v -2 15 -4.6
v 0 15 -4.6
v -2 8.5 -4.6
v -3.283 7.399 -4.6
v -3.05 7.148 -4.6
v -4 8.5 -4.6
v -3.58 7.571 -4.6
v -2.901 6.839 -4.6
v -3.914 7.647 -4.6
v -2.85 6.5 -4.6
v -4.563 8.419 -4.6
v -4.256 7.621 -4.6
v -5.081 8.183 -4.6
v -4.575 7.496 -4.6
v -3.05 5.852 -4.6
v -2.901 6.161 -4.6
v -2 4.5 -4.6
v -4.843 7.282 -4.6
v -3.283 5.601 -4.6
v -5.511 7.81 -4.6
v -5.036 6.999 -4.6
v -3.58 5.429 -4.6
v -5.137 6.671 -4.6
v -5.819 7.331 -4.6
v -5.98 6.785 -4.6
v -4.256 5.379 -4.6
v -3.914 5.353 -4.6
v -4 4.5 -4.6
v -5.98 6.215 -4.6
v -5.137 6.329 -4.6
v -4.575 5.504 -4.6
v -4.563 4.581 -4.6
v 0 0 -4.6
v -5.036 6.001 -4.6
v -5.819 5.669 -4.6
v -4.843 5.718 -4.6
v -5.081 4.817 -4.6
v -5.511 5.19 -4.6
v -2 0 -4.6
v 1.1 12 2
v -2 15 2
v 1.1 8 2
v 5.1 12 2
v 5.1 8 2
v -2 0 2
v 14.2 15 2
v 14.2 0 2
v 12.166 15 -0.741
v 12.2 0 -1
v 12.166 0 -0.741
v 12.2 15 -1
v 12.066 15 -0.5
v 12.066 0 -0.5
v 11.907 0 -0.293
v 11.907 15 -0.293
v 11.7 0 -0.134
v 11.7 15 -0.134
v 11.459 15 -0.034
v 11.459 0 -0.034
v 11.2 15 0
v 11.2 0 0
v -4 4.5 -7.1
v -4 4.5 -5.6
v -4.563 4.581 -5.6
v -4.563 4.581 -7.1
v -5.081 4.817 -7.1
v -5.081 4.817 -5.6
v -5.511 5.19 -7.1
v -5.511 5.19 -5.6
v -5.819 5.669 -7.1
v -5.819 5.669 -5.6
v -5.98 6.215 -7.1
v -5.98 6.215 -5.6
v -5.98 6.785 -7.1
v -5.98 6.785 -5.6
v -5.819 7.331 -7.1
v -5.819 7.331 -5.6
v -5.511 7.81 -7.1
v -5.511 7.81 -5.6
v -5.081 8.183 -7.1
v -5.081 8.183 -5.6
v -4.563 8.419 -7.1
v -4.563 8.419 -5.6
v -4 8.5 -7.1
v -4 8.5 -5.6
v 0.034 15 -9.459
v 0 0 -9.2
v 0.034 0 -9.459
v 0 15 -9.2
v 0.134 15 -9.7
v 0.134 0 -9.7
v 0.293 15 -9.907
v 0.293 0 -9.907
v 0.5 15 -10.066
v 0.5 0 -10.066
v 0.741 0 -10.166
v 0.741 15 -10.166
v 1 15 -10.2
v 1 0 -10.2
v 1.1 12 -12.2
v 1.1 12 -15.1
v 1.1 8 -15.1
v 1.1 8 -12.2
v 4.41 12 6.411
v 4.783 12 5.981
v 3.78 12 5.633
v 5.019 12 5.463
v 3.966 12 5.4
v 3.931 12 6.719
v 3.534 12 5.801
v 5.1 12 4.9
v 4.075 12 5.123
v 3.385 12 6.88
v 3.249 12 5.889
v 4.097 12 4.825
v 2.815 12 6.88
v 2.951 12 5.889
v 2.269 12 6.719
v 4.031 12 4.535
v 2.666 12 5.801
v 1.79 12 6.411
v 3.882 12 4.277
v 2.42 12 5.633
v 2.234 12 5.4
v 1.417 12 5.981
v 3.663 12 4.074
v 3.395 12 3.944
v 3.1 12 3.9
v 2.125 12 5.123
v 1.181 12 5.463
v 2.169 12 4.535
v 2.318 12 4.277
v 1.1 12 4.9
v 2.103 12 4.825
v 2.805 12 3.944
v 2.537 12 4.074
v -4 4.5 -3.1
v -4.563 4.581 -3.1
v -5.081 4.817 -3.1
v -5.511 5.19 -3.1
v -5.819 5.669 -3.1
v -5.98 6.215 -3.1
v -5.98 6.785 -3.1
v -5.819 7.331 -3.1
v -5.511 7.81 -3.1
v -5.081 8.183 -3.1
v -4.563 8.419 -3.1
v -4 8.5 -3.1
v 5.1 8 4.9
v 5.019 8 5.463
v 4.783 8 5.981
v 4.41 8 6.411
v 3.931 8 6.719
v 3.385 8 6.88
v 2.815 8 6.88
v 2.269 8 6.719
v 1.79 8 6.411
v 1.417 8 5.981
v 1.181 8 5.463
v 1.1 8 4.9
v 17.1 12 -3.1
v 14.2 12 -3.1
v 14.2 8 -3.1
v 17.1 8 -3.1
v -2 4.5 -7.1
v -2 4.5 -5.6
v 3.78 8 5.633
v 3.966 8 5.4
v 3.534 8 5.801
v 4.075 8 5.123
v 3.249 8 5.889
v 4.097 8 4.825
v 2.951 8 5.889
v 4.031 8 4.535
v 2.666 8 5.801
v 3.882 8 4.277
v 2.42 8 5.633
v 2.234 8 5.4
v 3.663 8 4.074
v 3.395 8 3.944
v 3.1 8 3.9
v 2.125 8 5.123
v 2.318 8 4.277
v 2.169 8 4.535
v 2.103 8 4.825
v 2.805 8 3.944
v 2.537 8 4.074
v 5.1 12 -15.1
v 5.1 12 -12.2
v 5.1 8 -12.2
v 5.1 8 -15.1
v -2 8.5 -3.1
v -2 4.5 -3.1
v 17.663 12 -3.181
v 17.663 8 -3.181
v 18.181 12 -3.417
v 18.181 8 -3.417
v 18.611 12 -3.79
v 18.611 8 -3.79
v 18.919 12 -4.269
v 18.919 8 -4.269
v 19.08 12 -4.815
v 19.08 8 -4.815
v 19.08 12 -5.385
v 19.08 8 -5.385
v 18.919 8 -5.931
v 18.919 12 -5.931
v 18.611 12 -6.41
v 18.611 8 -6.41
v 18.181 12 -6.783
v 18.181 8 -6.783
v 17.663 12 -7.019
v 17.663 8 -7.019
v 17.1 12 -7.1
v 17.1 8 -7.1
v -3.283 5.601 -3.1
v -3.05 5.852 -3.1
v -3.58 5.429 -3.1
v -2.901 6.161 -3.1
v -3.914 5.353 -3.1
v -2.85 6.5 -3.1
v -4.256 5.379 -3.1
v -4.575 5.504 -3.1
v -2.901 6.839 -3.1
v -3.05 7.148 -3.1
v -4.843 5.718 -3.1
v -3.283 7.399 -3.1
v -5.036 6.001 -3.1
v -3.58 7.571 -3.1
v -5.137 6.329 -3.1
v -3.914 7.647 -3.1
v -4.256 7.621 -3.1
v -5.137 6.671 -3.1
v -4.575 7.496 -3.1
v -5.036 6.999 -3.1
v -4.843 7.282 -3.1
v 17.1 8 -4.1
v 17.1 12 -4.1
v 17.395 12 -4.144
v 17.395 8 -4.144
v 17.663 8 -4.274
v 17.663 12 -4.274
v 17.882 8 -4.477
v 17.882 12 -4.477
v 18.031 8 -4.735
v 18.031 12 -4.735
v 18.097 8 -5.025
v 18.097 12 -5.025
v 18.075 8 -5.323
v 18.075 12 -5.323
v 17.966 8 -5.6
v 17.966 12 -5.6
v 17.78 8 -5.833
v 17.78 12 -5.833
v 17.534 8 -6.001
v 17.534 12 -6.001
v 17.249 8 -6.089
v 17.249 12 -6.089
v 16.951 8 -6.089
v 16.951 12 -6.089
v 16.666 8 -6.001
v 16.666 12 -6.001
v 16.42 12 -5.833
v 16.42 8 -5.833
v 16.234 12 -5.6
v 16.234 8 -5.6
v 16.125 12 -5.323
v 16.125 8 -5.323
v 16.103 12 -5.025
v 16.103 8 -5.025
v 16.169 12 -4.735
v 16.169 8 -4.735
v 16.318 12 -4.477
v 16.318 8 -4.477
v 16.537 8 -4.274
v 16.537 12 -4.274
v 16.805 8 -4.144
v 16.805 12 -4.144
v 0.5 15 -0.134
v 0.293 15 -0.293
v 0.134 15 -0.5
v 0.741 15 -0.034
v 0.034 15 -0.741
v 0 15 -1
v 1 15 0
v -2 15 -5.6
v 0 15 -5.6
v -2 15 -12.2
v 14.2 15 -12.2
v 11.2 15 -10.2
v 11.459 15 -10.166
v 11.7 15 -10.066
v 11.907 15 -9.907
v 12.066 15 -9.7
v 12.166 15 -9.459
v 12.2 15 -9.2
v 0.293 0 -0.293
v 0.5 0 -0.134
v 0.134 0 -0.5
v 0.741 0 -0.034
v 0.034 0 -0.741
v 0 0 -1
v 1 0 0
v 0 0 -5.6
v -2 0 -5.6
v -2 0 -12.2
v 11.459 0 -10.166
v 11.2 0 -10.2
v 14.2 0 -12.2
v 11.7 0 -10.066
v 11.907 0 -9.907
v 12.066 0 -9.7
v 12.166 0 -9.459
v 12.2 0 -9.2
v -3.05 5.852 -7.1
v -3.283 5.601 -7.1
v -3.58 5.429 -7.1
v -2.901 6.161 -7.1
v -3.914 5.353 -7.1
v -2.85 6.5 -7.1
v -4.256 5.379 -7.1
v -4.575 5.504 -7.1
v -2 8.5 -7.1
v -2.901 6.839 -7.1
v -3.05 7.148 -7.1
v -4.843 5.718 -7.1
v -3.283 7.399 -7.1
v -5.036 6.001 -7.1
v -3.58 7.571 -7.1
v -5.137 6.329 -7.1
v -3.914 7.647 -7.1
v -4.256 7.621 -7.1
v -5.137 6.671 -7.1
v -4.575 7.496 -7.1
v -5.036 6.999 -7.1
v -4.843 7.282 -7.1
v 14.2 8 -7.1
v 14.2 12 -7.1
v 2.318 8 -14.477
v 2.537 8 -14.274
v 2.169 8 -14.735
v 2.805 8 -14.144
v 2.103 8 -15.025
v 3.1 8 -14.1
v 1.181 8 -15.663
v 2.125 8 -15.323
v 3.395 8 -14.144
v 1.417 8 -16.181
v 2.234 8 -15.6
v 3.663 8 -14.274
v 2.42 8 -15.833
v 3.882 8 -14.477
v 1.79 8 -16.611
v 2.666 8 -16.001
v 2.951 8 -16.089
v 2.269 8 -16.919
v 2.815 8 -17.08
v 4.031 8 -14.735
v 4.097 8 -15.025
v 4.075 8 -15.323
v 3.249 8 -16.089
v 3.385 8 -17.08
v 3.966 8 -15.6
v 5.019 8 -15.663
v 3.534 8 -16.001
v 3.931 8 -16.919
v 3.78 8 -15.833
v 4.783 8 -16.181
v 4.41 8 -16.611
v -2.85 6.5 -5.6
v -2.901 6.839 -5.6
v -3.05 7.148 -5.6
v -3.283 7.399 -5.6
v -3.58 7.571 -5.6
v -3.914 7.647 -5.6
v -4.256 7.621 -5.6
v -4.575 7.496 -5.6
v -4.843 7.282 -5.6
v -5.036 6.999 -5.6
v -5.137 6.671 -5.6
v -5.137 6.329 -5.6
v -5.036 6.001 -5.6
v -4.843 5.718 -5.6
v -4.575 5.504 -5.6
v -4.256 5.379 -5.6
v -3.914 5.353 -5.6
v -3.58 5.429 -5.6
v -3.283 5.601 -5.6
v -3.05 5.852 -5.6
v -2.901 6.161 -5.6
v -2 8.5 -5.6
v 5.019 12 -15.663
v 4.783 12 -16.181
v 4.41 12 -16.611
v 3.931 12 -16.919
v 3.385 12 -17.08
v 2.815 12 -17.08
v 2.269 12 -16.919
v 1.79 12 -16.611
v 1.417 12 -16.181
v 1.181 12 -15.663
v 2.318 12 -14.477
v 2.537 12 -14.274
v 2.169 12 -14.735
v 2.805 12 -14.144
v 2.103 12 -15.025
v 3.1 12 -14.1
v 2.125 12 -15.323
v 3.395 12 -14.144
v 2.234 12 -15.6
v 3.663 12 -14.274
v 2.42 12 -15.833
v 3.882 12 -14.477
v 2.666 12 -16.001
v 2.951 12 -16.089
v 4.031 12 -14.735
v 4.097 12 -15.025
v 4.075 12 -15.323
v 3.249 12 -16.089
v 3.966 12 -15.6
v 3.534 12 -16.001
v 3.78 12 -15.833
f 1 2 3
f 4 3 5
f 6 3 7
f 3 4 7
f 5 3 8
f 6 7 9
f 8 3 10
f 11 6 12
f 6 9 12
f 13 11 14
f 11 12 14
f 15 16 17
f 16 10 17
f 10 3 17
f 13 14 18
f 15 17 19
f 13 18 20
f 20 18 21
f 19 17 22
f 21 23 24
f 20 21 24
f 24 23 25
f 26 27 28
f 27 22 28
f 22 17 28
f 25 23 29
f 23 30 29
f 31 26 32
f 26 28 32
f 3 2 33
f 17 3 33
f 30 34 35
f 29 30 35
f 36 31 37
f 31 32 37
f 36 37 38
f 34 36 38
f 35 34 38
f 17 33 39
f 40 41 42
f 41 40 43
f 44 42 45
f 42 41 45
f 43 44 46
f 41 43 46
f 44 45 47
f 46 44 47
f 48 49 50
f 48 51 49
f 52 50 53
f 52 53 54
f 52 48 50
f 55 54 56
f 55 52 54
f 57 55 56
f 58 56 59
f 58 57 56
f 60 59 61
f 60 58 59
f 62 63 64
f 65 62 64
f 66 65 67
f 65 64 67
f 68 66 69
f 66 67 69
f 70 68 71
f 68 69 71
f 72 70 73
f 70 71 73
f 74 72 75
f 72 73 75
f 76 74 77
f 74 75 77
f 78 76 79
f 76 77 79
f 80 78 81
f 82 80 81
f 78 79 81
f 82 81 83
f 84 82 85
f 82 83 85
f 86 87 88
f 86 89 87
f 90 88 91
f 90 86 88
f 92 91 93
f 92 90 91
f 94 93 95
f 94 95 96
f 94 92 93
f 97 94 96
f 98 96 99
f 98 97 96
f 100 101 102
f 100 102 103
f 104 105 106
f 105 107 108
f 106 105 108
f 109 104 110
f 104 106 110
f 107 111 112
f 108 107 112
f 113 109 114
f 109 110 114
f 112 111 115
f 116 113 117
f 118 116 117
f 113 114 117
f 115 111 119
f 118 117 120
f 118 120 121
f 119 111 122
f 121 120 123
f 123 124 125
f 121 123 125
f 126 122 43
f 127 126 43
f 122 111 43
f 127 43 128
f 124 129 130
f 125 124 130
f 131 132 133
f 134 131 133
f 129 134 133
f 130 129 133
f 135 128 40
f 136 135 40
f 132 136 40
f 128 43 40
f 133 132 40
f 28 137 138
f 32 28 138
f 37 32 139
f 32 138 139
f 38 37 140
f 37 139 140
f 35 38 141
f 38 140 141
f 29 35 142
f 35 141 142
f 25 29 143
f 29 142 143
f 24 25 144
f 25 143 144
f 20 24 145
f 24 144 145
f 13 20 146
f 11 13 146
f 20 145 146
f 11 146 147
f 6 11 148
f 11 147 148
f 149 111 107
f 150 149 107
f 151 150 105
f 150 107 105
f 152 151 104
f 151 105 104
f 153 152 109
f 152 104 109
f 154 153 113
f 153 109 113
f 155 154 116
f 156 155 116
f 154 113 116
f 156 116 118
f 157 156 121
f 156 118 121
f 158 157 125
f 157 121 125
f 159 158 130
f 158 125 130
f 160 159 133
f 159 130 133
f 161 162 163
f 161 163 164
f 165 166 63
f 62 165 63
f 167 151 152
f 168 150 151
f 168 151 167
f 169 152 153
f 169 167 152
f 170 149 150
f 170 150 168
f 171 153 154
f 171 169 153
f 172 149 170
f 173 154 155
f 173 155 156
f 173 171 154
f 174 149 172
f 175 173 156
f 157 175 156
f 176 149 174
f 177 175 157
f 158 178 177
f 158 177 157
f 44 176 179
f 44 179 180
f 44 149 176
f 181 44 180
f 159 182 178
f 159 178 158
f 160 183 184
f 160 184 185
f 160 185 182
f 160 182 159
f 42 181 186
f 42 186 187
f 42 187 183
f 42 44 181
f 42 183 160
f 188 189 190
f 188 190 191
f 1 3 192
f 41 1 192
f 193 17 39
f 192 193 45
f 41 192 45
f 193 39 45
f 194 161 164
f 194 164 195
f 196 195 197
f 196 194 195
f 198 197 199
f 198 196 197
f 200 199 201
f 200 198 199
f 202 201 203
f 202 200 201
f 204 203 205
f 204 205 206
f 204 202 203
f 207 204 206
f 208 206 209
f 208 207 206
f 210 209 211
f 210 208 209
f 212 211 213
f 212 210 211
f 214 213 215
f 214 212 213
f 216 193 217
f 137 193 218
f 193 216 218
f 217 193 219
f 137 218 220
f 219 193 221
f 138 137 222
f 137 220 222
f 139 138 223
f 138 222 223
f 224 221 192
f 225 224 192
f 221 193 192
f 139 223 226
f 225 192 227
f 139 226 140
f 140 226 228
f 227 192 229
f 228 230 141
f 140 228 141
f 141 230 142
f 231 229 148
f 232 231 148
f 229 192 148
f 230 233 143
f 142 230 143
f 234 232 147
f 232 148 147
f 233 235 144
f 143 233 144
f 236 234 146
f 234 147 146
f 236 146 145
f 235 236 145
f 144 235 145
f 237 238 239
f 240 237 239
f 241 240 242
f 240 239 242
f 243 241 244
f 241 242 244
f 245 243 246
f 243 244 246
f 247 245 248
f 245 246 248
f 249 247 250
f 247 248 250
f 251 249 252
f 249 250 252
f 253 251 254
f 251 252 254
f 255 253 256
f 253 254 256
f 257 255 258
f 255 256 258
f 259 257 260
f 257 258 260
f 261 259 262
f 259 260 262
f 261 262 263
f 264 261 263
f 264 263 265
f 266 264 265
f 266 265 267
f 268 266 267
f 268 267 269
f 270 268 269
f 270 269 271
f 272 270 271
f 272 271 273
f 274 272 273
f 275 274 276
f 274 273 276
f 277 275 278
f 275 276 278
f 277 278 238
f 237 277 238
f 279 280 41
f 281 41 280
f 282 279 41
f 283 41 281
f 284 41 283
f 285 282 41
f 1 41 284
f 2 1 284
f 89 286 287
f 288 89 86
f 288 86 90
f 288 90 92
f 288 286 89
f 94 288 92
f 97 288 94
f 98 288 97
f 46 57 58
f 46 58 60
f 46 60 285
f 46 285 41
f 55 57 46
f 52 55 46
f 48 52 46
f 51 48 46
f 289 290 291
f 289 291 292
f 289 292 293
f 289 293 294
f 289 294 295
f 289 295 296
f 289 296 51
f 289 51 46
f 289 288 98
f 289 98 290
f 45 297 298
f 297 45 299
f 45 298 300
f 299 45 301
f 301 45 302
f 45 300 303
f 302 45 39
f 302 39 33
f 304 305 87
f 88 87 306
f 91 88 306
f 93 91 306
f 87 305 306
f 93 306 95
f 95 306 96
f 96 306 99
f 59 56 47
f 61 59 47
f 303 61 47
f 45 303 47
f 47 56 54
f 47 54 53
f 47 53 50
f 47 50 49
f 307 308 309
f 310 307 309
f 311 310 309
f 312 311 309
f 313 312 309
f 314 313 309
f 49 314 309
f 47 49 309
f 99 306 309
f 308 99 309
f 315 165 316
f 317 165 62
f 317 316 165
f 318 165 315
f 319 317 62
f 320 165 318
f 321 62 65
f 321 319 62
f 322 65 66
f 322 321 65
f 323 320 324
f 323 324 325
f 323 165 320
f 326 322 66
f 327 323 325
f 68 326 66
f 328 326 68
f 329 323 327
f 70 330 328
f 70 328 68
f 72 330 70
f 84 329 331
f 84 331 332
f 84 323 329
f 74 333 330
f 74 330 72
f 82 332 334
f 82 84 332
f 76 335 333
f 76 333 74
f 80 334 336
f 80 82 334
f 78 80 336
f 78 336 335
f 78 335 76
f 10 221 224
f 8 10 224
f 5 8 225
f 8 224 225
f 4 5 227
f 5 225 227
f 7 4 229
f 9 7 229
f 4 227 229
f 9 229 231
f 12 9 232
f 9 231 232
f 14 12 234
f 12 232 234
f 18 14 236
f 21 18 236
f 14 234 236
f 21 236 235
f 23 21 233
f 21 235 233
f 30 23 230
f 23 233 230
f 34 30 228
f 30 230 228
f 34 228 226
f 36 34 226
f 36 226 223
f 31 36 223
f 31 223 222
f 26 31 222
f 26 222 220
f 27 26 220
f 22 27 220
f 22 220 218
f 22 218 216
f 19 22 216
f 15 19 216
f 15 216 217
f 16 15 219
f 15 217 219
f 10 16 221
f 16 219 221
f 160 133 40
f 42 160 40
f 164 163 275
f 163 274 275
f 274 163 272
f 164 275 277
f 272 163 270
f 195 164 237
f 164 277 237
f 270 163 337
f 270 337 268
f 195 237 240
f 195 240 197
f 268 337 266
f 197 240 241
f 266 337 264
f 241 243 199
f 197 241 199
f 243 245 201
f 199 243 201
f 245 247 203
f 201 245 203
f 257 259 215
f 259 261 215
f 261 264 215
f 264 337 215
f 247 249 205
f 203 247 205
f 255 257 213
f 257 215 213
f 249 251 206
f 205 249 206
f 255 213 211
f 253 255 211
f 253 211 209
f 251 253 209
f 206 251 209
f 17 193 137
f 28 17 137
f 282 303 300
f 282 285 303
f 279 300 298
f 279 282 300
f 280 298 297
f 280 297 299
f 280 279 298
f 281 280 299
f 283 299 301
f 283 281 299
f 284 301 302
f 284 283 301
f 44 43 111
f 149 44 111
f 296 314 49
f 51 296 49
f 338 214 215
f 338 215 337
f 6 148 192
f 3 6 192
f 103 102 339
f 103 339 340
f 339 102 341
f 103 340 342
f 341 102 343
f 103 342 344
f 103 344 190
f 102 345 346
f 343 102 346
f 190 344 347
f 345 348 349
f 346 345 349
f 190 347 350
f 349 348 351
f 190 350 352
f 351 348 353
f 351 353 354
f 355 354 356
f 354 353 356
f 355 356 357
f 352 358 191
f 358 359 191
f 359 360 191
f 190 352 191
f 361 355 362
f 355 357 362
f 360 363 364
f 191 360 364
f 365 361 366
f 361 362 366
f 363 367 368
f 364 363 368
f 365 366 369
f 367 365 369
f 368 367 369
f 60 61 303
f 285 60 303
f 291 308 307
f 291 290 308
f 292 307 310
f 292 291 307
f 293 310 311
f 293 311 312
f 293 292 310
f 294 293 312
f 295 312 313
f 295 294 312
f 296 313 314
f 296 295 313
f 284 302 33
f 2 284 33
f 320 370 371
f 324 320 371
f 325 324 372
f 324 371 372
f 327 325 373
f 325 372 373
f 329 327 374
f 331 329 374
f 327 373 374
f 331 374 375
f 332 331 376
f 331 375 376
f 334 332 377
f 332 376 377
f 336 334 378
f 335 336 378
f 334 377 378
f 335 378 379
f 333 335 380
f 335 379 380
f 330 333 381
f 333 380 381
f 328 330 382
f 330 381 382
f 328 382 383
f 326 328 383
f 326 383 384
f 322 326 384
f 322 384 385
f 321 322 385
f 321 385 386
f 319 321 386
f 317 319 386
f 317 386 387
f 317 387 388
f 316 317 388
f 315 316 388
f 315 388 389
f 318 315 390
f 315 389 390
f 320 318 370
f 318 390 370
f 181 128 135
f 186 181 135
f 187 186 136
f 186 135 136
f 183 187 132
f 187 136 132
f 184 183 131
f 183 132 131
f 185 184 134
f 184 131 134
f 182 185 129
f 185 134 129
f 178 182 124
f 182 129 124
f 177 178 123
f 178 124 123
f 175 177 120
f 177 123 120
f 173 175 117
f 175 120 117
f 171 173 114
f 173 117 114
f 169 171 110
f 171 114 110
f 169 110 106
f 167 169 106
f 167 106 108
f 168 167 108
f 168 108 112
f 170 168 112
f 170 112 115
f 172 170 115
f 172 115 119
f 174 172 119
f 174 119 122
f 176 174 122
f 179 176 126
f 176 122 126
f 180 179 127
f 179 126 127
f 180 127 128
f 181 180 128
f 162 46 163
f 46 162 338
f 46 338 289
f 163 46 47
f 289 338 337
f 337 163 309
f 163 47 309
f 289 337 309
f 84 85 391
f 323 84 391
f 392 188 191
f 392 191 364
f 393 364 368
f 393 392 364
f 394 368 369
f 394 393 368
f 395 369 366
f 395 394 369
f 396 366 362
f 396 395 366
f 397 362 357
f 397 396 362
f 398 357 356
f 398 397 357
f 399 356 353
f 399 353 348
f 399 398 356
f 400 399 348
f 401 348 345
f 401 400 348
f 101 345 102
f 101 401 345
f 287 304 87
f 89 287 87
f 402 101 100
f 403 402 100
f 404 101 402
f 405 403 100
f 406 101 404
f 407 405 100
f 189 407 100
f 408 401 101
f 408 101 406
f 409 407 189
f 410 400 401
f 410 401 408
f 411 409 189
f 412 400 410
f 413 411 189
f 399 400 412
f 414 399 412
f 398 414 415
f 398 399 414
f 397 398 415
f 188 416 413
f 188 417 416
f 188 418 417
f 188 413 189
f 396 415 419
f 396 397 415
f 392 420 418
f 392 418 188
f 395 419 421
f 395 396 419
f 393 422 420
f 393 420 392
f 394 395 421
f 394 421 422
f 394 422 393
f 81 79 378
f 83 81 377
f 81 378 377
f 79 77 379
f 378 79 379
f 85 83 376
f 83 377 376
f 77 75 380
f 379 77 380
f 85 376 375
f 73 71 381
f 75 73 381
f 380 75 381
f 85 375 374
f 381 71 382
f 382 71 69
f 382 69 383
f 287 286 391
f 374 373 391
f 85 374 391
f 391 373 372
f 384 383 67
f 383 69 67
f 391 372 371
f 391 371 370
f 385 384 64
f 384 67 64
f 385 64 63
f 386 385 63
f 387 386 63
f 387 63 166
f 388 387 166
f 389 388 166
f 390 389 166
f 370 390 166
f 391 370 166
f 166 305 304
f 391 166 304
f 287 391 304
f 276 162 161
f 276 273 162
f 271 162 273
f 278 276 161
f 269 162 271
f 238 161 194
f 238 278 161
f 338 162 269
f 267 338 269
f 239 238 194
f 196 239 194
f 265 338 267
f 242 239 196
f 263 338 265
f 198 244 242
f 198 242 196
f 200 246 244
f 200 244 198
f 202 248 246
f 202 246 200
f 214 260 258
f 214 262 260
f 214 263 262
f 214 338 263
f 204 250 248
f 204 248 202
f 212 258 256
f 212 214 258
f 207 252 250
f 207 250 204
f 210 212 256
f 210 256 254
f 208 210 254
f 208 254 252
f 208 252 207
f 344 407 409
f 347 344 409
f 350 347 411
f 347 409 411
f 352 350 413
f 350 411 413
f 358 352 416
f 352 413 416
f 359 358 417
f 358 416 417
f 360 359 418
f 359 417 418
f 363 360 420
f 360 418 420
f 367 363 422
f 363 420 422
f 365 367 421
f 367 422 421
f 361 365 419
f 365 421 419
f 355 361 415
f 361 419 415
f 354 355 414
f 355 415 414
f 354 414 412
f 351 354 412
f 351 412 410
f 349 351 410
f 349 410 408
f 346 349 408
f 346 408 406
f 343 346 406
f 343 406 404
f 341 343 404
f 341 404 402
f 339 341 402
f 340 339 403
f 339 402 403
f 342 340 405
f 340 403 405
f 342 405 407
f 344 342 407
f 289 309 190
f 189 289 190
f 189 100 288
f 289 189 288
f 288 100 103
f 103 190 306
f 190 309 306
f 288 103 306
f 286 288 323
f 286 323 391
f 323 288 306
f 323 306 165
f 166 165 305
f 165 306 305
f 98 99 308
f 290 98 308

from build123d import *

# Parameters (mm, degrees)
EXTRUDE_1_DEPTH = 15
SKETCH_2_R      = 1.15
EXTRUDE_2_DEPTH = 1.5
EXTRUDE_START   = 2.5
SKETCH_2_2_R    = 1.15
EXTRUDE_3_DEPTH = 1.5
FILLET_1_R      = 1
SKETCH_4_R      = 1
EXTRUDE_5_DEPTH = 4


with BuildPart() as part:
    # 草图1 → 凸台-拉伸1 (new body)
    with BuildSketch(Plane(origin=(0, 0, 0), x_dir=(1, 0, 0), z_dir=(0, 1, 0))):
        Polygon((-2, -2), (14.2, -2), (14.2, 12.2), (-2, 12.2), (-2, 5.6), (0, 5.6), (0, 10.2), (12.2, 10.2), (12.2, 0), (0, 0), (0, 4.6), (-2, 4.6), align=None)
    extrude(amount=EXTRUDE_1_DEPTH)

    # 草图2 → 凸台-拉伸2 (add)
    with BuildSketch(Plane.XY.offset(-5.6)):
        with BuildLine():
            Line((-4, 8.5), (-2, 8.5))
            Line((-2, 8.5), (-2, 4.5))
            Line((-2, 4.5), (-4, 4.5))
            ThreePointArc((-4, 4.5), (-6, 6.5), (-4, 8.5))
        make_face()
        with Locations((-4, 6.5)):
            Circle(SKETCH_2_R, mode=Mode.SUBTRACT)
    extrude(amount=-EXTRUDE_2_DEPTH)

    # 草图2<2> → 凸台-拉伸3 (add)
    with BuildSketch(Plane.XY.offset(-5.6).offset(EXTRUDE_START)):
        with BuildLine():
            Line((-4, 8.5), (-2, 8.5))
            Line((-2, 8.5), (-2, 4.5))
            Line((-2, 4.5), (-4, 4.5))
            ThreePointArc((-4, 4.5), (-6, 6.5), (-4, 8.5))
        make_face()
        with Locations((-4, 6.5)):
            Circle(SKETCH_2_2_R, mode=Mode.SUBTRACT)
    extrude(amount=-EXTRUDE_3_DEPTH)

    # 圆角1
    fillet_1_edges = [part.edges().sort_by_distance(p)[0] for p in [
        (0, 7.5, 0),
        (12.2, 7.5, 0),
        (12.2, 7.5, -10.2),
        (0, 7.5, -10.2),
    ]]
    fillet(fillet_1_edges, radius=FILLET_1_R)

    # 草图4 → 凸台-拉伸5 (add)
    # profile 1 of 3: a face of its own
    with BuildSketch(Plane(origin=(0, 12, 0), x_dir=(1, 0, 0), z_dir=(0, 1, 0))):
        with BuildLine():
            Line((5.1, -2), (5.1, -4.9))
            ThreePointArc((5.1, -4.9), (3.1, -6.9), (1.1, -4.9))
            Line((1.1, -4.9), (1.1, -2))
            Line((1.1, -2), (5.1, -2))
        make_face()
        with Locations(Location((3.1, -4.9, 0), (0, 0, 90))):
            Circle(SKETCH_4_R, mode=Mode.SUBTRACT)
    # profile 2 of 3: a face of its own
    with BuildSketch(Plane(origin=(0, 12, 0), x_dir=(1, 0, 0), z_dir=(0, 1, 0))):
        with BuildLine():
            Line((1.1, 15.1), (1.1, 12.2))
            Line((1.1, 12.2), (5.1, 12.2))
            Line((5.1, 12.2), (5.1, 15.1))
            ThreePointArc((5.1, 15.1), (3.1, 17.1), (1.1, 15.1))
        make_face()
        with Locations(Location((3.1, 15.1, 0), (0, 0, 270))):
            Circle(SKETCH_4_R, mode=Mode.SUBTRACT)
    # profile 3 of 3: a face of its own
    with BuildSketch(Plane(origin=(0, 12, 0), x_dir=(1, 0, 0), z_dir=(0, 1, 0))):
        with BuildLine():
            Line((17.1, 7.1), (14.2, 7.1))
            Line((14.2, 7.1), (14.2, 3.1))
            Line((14.2, 3.1), (17.1, 3.1))
            ThreePointArc((17.1, 3.1), (19.1, 5.1), (17.1, 7.1))
        make_face()
        with Locations(Location((17.1, 5.1, 0), (0, 0, 270))):
            Circle(SKETCH_4_R, mode=Mode.SUBTRACT)
    extrude(amount=-EXTRUDE_5_DEPTH)


solid = part.part
